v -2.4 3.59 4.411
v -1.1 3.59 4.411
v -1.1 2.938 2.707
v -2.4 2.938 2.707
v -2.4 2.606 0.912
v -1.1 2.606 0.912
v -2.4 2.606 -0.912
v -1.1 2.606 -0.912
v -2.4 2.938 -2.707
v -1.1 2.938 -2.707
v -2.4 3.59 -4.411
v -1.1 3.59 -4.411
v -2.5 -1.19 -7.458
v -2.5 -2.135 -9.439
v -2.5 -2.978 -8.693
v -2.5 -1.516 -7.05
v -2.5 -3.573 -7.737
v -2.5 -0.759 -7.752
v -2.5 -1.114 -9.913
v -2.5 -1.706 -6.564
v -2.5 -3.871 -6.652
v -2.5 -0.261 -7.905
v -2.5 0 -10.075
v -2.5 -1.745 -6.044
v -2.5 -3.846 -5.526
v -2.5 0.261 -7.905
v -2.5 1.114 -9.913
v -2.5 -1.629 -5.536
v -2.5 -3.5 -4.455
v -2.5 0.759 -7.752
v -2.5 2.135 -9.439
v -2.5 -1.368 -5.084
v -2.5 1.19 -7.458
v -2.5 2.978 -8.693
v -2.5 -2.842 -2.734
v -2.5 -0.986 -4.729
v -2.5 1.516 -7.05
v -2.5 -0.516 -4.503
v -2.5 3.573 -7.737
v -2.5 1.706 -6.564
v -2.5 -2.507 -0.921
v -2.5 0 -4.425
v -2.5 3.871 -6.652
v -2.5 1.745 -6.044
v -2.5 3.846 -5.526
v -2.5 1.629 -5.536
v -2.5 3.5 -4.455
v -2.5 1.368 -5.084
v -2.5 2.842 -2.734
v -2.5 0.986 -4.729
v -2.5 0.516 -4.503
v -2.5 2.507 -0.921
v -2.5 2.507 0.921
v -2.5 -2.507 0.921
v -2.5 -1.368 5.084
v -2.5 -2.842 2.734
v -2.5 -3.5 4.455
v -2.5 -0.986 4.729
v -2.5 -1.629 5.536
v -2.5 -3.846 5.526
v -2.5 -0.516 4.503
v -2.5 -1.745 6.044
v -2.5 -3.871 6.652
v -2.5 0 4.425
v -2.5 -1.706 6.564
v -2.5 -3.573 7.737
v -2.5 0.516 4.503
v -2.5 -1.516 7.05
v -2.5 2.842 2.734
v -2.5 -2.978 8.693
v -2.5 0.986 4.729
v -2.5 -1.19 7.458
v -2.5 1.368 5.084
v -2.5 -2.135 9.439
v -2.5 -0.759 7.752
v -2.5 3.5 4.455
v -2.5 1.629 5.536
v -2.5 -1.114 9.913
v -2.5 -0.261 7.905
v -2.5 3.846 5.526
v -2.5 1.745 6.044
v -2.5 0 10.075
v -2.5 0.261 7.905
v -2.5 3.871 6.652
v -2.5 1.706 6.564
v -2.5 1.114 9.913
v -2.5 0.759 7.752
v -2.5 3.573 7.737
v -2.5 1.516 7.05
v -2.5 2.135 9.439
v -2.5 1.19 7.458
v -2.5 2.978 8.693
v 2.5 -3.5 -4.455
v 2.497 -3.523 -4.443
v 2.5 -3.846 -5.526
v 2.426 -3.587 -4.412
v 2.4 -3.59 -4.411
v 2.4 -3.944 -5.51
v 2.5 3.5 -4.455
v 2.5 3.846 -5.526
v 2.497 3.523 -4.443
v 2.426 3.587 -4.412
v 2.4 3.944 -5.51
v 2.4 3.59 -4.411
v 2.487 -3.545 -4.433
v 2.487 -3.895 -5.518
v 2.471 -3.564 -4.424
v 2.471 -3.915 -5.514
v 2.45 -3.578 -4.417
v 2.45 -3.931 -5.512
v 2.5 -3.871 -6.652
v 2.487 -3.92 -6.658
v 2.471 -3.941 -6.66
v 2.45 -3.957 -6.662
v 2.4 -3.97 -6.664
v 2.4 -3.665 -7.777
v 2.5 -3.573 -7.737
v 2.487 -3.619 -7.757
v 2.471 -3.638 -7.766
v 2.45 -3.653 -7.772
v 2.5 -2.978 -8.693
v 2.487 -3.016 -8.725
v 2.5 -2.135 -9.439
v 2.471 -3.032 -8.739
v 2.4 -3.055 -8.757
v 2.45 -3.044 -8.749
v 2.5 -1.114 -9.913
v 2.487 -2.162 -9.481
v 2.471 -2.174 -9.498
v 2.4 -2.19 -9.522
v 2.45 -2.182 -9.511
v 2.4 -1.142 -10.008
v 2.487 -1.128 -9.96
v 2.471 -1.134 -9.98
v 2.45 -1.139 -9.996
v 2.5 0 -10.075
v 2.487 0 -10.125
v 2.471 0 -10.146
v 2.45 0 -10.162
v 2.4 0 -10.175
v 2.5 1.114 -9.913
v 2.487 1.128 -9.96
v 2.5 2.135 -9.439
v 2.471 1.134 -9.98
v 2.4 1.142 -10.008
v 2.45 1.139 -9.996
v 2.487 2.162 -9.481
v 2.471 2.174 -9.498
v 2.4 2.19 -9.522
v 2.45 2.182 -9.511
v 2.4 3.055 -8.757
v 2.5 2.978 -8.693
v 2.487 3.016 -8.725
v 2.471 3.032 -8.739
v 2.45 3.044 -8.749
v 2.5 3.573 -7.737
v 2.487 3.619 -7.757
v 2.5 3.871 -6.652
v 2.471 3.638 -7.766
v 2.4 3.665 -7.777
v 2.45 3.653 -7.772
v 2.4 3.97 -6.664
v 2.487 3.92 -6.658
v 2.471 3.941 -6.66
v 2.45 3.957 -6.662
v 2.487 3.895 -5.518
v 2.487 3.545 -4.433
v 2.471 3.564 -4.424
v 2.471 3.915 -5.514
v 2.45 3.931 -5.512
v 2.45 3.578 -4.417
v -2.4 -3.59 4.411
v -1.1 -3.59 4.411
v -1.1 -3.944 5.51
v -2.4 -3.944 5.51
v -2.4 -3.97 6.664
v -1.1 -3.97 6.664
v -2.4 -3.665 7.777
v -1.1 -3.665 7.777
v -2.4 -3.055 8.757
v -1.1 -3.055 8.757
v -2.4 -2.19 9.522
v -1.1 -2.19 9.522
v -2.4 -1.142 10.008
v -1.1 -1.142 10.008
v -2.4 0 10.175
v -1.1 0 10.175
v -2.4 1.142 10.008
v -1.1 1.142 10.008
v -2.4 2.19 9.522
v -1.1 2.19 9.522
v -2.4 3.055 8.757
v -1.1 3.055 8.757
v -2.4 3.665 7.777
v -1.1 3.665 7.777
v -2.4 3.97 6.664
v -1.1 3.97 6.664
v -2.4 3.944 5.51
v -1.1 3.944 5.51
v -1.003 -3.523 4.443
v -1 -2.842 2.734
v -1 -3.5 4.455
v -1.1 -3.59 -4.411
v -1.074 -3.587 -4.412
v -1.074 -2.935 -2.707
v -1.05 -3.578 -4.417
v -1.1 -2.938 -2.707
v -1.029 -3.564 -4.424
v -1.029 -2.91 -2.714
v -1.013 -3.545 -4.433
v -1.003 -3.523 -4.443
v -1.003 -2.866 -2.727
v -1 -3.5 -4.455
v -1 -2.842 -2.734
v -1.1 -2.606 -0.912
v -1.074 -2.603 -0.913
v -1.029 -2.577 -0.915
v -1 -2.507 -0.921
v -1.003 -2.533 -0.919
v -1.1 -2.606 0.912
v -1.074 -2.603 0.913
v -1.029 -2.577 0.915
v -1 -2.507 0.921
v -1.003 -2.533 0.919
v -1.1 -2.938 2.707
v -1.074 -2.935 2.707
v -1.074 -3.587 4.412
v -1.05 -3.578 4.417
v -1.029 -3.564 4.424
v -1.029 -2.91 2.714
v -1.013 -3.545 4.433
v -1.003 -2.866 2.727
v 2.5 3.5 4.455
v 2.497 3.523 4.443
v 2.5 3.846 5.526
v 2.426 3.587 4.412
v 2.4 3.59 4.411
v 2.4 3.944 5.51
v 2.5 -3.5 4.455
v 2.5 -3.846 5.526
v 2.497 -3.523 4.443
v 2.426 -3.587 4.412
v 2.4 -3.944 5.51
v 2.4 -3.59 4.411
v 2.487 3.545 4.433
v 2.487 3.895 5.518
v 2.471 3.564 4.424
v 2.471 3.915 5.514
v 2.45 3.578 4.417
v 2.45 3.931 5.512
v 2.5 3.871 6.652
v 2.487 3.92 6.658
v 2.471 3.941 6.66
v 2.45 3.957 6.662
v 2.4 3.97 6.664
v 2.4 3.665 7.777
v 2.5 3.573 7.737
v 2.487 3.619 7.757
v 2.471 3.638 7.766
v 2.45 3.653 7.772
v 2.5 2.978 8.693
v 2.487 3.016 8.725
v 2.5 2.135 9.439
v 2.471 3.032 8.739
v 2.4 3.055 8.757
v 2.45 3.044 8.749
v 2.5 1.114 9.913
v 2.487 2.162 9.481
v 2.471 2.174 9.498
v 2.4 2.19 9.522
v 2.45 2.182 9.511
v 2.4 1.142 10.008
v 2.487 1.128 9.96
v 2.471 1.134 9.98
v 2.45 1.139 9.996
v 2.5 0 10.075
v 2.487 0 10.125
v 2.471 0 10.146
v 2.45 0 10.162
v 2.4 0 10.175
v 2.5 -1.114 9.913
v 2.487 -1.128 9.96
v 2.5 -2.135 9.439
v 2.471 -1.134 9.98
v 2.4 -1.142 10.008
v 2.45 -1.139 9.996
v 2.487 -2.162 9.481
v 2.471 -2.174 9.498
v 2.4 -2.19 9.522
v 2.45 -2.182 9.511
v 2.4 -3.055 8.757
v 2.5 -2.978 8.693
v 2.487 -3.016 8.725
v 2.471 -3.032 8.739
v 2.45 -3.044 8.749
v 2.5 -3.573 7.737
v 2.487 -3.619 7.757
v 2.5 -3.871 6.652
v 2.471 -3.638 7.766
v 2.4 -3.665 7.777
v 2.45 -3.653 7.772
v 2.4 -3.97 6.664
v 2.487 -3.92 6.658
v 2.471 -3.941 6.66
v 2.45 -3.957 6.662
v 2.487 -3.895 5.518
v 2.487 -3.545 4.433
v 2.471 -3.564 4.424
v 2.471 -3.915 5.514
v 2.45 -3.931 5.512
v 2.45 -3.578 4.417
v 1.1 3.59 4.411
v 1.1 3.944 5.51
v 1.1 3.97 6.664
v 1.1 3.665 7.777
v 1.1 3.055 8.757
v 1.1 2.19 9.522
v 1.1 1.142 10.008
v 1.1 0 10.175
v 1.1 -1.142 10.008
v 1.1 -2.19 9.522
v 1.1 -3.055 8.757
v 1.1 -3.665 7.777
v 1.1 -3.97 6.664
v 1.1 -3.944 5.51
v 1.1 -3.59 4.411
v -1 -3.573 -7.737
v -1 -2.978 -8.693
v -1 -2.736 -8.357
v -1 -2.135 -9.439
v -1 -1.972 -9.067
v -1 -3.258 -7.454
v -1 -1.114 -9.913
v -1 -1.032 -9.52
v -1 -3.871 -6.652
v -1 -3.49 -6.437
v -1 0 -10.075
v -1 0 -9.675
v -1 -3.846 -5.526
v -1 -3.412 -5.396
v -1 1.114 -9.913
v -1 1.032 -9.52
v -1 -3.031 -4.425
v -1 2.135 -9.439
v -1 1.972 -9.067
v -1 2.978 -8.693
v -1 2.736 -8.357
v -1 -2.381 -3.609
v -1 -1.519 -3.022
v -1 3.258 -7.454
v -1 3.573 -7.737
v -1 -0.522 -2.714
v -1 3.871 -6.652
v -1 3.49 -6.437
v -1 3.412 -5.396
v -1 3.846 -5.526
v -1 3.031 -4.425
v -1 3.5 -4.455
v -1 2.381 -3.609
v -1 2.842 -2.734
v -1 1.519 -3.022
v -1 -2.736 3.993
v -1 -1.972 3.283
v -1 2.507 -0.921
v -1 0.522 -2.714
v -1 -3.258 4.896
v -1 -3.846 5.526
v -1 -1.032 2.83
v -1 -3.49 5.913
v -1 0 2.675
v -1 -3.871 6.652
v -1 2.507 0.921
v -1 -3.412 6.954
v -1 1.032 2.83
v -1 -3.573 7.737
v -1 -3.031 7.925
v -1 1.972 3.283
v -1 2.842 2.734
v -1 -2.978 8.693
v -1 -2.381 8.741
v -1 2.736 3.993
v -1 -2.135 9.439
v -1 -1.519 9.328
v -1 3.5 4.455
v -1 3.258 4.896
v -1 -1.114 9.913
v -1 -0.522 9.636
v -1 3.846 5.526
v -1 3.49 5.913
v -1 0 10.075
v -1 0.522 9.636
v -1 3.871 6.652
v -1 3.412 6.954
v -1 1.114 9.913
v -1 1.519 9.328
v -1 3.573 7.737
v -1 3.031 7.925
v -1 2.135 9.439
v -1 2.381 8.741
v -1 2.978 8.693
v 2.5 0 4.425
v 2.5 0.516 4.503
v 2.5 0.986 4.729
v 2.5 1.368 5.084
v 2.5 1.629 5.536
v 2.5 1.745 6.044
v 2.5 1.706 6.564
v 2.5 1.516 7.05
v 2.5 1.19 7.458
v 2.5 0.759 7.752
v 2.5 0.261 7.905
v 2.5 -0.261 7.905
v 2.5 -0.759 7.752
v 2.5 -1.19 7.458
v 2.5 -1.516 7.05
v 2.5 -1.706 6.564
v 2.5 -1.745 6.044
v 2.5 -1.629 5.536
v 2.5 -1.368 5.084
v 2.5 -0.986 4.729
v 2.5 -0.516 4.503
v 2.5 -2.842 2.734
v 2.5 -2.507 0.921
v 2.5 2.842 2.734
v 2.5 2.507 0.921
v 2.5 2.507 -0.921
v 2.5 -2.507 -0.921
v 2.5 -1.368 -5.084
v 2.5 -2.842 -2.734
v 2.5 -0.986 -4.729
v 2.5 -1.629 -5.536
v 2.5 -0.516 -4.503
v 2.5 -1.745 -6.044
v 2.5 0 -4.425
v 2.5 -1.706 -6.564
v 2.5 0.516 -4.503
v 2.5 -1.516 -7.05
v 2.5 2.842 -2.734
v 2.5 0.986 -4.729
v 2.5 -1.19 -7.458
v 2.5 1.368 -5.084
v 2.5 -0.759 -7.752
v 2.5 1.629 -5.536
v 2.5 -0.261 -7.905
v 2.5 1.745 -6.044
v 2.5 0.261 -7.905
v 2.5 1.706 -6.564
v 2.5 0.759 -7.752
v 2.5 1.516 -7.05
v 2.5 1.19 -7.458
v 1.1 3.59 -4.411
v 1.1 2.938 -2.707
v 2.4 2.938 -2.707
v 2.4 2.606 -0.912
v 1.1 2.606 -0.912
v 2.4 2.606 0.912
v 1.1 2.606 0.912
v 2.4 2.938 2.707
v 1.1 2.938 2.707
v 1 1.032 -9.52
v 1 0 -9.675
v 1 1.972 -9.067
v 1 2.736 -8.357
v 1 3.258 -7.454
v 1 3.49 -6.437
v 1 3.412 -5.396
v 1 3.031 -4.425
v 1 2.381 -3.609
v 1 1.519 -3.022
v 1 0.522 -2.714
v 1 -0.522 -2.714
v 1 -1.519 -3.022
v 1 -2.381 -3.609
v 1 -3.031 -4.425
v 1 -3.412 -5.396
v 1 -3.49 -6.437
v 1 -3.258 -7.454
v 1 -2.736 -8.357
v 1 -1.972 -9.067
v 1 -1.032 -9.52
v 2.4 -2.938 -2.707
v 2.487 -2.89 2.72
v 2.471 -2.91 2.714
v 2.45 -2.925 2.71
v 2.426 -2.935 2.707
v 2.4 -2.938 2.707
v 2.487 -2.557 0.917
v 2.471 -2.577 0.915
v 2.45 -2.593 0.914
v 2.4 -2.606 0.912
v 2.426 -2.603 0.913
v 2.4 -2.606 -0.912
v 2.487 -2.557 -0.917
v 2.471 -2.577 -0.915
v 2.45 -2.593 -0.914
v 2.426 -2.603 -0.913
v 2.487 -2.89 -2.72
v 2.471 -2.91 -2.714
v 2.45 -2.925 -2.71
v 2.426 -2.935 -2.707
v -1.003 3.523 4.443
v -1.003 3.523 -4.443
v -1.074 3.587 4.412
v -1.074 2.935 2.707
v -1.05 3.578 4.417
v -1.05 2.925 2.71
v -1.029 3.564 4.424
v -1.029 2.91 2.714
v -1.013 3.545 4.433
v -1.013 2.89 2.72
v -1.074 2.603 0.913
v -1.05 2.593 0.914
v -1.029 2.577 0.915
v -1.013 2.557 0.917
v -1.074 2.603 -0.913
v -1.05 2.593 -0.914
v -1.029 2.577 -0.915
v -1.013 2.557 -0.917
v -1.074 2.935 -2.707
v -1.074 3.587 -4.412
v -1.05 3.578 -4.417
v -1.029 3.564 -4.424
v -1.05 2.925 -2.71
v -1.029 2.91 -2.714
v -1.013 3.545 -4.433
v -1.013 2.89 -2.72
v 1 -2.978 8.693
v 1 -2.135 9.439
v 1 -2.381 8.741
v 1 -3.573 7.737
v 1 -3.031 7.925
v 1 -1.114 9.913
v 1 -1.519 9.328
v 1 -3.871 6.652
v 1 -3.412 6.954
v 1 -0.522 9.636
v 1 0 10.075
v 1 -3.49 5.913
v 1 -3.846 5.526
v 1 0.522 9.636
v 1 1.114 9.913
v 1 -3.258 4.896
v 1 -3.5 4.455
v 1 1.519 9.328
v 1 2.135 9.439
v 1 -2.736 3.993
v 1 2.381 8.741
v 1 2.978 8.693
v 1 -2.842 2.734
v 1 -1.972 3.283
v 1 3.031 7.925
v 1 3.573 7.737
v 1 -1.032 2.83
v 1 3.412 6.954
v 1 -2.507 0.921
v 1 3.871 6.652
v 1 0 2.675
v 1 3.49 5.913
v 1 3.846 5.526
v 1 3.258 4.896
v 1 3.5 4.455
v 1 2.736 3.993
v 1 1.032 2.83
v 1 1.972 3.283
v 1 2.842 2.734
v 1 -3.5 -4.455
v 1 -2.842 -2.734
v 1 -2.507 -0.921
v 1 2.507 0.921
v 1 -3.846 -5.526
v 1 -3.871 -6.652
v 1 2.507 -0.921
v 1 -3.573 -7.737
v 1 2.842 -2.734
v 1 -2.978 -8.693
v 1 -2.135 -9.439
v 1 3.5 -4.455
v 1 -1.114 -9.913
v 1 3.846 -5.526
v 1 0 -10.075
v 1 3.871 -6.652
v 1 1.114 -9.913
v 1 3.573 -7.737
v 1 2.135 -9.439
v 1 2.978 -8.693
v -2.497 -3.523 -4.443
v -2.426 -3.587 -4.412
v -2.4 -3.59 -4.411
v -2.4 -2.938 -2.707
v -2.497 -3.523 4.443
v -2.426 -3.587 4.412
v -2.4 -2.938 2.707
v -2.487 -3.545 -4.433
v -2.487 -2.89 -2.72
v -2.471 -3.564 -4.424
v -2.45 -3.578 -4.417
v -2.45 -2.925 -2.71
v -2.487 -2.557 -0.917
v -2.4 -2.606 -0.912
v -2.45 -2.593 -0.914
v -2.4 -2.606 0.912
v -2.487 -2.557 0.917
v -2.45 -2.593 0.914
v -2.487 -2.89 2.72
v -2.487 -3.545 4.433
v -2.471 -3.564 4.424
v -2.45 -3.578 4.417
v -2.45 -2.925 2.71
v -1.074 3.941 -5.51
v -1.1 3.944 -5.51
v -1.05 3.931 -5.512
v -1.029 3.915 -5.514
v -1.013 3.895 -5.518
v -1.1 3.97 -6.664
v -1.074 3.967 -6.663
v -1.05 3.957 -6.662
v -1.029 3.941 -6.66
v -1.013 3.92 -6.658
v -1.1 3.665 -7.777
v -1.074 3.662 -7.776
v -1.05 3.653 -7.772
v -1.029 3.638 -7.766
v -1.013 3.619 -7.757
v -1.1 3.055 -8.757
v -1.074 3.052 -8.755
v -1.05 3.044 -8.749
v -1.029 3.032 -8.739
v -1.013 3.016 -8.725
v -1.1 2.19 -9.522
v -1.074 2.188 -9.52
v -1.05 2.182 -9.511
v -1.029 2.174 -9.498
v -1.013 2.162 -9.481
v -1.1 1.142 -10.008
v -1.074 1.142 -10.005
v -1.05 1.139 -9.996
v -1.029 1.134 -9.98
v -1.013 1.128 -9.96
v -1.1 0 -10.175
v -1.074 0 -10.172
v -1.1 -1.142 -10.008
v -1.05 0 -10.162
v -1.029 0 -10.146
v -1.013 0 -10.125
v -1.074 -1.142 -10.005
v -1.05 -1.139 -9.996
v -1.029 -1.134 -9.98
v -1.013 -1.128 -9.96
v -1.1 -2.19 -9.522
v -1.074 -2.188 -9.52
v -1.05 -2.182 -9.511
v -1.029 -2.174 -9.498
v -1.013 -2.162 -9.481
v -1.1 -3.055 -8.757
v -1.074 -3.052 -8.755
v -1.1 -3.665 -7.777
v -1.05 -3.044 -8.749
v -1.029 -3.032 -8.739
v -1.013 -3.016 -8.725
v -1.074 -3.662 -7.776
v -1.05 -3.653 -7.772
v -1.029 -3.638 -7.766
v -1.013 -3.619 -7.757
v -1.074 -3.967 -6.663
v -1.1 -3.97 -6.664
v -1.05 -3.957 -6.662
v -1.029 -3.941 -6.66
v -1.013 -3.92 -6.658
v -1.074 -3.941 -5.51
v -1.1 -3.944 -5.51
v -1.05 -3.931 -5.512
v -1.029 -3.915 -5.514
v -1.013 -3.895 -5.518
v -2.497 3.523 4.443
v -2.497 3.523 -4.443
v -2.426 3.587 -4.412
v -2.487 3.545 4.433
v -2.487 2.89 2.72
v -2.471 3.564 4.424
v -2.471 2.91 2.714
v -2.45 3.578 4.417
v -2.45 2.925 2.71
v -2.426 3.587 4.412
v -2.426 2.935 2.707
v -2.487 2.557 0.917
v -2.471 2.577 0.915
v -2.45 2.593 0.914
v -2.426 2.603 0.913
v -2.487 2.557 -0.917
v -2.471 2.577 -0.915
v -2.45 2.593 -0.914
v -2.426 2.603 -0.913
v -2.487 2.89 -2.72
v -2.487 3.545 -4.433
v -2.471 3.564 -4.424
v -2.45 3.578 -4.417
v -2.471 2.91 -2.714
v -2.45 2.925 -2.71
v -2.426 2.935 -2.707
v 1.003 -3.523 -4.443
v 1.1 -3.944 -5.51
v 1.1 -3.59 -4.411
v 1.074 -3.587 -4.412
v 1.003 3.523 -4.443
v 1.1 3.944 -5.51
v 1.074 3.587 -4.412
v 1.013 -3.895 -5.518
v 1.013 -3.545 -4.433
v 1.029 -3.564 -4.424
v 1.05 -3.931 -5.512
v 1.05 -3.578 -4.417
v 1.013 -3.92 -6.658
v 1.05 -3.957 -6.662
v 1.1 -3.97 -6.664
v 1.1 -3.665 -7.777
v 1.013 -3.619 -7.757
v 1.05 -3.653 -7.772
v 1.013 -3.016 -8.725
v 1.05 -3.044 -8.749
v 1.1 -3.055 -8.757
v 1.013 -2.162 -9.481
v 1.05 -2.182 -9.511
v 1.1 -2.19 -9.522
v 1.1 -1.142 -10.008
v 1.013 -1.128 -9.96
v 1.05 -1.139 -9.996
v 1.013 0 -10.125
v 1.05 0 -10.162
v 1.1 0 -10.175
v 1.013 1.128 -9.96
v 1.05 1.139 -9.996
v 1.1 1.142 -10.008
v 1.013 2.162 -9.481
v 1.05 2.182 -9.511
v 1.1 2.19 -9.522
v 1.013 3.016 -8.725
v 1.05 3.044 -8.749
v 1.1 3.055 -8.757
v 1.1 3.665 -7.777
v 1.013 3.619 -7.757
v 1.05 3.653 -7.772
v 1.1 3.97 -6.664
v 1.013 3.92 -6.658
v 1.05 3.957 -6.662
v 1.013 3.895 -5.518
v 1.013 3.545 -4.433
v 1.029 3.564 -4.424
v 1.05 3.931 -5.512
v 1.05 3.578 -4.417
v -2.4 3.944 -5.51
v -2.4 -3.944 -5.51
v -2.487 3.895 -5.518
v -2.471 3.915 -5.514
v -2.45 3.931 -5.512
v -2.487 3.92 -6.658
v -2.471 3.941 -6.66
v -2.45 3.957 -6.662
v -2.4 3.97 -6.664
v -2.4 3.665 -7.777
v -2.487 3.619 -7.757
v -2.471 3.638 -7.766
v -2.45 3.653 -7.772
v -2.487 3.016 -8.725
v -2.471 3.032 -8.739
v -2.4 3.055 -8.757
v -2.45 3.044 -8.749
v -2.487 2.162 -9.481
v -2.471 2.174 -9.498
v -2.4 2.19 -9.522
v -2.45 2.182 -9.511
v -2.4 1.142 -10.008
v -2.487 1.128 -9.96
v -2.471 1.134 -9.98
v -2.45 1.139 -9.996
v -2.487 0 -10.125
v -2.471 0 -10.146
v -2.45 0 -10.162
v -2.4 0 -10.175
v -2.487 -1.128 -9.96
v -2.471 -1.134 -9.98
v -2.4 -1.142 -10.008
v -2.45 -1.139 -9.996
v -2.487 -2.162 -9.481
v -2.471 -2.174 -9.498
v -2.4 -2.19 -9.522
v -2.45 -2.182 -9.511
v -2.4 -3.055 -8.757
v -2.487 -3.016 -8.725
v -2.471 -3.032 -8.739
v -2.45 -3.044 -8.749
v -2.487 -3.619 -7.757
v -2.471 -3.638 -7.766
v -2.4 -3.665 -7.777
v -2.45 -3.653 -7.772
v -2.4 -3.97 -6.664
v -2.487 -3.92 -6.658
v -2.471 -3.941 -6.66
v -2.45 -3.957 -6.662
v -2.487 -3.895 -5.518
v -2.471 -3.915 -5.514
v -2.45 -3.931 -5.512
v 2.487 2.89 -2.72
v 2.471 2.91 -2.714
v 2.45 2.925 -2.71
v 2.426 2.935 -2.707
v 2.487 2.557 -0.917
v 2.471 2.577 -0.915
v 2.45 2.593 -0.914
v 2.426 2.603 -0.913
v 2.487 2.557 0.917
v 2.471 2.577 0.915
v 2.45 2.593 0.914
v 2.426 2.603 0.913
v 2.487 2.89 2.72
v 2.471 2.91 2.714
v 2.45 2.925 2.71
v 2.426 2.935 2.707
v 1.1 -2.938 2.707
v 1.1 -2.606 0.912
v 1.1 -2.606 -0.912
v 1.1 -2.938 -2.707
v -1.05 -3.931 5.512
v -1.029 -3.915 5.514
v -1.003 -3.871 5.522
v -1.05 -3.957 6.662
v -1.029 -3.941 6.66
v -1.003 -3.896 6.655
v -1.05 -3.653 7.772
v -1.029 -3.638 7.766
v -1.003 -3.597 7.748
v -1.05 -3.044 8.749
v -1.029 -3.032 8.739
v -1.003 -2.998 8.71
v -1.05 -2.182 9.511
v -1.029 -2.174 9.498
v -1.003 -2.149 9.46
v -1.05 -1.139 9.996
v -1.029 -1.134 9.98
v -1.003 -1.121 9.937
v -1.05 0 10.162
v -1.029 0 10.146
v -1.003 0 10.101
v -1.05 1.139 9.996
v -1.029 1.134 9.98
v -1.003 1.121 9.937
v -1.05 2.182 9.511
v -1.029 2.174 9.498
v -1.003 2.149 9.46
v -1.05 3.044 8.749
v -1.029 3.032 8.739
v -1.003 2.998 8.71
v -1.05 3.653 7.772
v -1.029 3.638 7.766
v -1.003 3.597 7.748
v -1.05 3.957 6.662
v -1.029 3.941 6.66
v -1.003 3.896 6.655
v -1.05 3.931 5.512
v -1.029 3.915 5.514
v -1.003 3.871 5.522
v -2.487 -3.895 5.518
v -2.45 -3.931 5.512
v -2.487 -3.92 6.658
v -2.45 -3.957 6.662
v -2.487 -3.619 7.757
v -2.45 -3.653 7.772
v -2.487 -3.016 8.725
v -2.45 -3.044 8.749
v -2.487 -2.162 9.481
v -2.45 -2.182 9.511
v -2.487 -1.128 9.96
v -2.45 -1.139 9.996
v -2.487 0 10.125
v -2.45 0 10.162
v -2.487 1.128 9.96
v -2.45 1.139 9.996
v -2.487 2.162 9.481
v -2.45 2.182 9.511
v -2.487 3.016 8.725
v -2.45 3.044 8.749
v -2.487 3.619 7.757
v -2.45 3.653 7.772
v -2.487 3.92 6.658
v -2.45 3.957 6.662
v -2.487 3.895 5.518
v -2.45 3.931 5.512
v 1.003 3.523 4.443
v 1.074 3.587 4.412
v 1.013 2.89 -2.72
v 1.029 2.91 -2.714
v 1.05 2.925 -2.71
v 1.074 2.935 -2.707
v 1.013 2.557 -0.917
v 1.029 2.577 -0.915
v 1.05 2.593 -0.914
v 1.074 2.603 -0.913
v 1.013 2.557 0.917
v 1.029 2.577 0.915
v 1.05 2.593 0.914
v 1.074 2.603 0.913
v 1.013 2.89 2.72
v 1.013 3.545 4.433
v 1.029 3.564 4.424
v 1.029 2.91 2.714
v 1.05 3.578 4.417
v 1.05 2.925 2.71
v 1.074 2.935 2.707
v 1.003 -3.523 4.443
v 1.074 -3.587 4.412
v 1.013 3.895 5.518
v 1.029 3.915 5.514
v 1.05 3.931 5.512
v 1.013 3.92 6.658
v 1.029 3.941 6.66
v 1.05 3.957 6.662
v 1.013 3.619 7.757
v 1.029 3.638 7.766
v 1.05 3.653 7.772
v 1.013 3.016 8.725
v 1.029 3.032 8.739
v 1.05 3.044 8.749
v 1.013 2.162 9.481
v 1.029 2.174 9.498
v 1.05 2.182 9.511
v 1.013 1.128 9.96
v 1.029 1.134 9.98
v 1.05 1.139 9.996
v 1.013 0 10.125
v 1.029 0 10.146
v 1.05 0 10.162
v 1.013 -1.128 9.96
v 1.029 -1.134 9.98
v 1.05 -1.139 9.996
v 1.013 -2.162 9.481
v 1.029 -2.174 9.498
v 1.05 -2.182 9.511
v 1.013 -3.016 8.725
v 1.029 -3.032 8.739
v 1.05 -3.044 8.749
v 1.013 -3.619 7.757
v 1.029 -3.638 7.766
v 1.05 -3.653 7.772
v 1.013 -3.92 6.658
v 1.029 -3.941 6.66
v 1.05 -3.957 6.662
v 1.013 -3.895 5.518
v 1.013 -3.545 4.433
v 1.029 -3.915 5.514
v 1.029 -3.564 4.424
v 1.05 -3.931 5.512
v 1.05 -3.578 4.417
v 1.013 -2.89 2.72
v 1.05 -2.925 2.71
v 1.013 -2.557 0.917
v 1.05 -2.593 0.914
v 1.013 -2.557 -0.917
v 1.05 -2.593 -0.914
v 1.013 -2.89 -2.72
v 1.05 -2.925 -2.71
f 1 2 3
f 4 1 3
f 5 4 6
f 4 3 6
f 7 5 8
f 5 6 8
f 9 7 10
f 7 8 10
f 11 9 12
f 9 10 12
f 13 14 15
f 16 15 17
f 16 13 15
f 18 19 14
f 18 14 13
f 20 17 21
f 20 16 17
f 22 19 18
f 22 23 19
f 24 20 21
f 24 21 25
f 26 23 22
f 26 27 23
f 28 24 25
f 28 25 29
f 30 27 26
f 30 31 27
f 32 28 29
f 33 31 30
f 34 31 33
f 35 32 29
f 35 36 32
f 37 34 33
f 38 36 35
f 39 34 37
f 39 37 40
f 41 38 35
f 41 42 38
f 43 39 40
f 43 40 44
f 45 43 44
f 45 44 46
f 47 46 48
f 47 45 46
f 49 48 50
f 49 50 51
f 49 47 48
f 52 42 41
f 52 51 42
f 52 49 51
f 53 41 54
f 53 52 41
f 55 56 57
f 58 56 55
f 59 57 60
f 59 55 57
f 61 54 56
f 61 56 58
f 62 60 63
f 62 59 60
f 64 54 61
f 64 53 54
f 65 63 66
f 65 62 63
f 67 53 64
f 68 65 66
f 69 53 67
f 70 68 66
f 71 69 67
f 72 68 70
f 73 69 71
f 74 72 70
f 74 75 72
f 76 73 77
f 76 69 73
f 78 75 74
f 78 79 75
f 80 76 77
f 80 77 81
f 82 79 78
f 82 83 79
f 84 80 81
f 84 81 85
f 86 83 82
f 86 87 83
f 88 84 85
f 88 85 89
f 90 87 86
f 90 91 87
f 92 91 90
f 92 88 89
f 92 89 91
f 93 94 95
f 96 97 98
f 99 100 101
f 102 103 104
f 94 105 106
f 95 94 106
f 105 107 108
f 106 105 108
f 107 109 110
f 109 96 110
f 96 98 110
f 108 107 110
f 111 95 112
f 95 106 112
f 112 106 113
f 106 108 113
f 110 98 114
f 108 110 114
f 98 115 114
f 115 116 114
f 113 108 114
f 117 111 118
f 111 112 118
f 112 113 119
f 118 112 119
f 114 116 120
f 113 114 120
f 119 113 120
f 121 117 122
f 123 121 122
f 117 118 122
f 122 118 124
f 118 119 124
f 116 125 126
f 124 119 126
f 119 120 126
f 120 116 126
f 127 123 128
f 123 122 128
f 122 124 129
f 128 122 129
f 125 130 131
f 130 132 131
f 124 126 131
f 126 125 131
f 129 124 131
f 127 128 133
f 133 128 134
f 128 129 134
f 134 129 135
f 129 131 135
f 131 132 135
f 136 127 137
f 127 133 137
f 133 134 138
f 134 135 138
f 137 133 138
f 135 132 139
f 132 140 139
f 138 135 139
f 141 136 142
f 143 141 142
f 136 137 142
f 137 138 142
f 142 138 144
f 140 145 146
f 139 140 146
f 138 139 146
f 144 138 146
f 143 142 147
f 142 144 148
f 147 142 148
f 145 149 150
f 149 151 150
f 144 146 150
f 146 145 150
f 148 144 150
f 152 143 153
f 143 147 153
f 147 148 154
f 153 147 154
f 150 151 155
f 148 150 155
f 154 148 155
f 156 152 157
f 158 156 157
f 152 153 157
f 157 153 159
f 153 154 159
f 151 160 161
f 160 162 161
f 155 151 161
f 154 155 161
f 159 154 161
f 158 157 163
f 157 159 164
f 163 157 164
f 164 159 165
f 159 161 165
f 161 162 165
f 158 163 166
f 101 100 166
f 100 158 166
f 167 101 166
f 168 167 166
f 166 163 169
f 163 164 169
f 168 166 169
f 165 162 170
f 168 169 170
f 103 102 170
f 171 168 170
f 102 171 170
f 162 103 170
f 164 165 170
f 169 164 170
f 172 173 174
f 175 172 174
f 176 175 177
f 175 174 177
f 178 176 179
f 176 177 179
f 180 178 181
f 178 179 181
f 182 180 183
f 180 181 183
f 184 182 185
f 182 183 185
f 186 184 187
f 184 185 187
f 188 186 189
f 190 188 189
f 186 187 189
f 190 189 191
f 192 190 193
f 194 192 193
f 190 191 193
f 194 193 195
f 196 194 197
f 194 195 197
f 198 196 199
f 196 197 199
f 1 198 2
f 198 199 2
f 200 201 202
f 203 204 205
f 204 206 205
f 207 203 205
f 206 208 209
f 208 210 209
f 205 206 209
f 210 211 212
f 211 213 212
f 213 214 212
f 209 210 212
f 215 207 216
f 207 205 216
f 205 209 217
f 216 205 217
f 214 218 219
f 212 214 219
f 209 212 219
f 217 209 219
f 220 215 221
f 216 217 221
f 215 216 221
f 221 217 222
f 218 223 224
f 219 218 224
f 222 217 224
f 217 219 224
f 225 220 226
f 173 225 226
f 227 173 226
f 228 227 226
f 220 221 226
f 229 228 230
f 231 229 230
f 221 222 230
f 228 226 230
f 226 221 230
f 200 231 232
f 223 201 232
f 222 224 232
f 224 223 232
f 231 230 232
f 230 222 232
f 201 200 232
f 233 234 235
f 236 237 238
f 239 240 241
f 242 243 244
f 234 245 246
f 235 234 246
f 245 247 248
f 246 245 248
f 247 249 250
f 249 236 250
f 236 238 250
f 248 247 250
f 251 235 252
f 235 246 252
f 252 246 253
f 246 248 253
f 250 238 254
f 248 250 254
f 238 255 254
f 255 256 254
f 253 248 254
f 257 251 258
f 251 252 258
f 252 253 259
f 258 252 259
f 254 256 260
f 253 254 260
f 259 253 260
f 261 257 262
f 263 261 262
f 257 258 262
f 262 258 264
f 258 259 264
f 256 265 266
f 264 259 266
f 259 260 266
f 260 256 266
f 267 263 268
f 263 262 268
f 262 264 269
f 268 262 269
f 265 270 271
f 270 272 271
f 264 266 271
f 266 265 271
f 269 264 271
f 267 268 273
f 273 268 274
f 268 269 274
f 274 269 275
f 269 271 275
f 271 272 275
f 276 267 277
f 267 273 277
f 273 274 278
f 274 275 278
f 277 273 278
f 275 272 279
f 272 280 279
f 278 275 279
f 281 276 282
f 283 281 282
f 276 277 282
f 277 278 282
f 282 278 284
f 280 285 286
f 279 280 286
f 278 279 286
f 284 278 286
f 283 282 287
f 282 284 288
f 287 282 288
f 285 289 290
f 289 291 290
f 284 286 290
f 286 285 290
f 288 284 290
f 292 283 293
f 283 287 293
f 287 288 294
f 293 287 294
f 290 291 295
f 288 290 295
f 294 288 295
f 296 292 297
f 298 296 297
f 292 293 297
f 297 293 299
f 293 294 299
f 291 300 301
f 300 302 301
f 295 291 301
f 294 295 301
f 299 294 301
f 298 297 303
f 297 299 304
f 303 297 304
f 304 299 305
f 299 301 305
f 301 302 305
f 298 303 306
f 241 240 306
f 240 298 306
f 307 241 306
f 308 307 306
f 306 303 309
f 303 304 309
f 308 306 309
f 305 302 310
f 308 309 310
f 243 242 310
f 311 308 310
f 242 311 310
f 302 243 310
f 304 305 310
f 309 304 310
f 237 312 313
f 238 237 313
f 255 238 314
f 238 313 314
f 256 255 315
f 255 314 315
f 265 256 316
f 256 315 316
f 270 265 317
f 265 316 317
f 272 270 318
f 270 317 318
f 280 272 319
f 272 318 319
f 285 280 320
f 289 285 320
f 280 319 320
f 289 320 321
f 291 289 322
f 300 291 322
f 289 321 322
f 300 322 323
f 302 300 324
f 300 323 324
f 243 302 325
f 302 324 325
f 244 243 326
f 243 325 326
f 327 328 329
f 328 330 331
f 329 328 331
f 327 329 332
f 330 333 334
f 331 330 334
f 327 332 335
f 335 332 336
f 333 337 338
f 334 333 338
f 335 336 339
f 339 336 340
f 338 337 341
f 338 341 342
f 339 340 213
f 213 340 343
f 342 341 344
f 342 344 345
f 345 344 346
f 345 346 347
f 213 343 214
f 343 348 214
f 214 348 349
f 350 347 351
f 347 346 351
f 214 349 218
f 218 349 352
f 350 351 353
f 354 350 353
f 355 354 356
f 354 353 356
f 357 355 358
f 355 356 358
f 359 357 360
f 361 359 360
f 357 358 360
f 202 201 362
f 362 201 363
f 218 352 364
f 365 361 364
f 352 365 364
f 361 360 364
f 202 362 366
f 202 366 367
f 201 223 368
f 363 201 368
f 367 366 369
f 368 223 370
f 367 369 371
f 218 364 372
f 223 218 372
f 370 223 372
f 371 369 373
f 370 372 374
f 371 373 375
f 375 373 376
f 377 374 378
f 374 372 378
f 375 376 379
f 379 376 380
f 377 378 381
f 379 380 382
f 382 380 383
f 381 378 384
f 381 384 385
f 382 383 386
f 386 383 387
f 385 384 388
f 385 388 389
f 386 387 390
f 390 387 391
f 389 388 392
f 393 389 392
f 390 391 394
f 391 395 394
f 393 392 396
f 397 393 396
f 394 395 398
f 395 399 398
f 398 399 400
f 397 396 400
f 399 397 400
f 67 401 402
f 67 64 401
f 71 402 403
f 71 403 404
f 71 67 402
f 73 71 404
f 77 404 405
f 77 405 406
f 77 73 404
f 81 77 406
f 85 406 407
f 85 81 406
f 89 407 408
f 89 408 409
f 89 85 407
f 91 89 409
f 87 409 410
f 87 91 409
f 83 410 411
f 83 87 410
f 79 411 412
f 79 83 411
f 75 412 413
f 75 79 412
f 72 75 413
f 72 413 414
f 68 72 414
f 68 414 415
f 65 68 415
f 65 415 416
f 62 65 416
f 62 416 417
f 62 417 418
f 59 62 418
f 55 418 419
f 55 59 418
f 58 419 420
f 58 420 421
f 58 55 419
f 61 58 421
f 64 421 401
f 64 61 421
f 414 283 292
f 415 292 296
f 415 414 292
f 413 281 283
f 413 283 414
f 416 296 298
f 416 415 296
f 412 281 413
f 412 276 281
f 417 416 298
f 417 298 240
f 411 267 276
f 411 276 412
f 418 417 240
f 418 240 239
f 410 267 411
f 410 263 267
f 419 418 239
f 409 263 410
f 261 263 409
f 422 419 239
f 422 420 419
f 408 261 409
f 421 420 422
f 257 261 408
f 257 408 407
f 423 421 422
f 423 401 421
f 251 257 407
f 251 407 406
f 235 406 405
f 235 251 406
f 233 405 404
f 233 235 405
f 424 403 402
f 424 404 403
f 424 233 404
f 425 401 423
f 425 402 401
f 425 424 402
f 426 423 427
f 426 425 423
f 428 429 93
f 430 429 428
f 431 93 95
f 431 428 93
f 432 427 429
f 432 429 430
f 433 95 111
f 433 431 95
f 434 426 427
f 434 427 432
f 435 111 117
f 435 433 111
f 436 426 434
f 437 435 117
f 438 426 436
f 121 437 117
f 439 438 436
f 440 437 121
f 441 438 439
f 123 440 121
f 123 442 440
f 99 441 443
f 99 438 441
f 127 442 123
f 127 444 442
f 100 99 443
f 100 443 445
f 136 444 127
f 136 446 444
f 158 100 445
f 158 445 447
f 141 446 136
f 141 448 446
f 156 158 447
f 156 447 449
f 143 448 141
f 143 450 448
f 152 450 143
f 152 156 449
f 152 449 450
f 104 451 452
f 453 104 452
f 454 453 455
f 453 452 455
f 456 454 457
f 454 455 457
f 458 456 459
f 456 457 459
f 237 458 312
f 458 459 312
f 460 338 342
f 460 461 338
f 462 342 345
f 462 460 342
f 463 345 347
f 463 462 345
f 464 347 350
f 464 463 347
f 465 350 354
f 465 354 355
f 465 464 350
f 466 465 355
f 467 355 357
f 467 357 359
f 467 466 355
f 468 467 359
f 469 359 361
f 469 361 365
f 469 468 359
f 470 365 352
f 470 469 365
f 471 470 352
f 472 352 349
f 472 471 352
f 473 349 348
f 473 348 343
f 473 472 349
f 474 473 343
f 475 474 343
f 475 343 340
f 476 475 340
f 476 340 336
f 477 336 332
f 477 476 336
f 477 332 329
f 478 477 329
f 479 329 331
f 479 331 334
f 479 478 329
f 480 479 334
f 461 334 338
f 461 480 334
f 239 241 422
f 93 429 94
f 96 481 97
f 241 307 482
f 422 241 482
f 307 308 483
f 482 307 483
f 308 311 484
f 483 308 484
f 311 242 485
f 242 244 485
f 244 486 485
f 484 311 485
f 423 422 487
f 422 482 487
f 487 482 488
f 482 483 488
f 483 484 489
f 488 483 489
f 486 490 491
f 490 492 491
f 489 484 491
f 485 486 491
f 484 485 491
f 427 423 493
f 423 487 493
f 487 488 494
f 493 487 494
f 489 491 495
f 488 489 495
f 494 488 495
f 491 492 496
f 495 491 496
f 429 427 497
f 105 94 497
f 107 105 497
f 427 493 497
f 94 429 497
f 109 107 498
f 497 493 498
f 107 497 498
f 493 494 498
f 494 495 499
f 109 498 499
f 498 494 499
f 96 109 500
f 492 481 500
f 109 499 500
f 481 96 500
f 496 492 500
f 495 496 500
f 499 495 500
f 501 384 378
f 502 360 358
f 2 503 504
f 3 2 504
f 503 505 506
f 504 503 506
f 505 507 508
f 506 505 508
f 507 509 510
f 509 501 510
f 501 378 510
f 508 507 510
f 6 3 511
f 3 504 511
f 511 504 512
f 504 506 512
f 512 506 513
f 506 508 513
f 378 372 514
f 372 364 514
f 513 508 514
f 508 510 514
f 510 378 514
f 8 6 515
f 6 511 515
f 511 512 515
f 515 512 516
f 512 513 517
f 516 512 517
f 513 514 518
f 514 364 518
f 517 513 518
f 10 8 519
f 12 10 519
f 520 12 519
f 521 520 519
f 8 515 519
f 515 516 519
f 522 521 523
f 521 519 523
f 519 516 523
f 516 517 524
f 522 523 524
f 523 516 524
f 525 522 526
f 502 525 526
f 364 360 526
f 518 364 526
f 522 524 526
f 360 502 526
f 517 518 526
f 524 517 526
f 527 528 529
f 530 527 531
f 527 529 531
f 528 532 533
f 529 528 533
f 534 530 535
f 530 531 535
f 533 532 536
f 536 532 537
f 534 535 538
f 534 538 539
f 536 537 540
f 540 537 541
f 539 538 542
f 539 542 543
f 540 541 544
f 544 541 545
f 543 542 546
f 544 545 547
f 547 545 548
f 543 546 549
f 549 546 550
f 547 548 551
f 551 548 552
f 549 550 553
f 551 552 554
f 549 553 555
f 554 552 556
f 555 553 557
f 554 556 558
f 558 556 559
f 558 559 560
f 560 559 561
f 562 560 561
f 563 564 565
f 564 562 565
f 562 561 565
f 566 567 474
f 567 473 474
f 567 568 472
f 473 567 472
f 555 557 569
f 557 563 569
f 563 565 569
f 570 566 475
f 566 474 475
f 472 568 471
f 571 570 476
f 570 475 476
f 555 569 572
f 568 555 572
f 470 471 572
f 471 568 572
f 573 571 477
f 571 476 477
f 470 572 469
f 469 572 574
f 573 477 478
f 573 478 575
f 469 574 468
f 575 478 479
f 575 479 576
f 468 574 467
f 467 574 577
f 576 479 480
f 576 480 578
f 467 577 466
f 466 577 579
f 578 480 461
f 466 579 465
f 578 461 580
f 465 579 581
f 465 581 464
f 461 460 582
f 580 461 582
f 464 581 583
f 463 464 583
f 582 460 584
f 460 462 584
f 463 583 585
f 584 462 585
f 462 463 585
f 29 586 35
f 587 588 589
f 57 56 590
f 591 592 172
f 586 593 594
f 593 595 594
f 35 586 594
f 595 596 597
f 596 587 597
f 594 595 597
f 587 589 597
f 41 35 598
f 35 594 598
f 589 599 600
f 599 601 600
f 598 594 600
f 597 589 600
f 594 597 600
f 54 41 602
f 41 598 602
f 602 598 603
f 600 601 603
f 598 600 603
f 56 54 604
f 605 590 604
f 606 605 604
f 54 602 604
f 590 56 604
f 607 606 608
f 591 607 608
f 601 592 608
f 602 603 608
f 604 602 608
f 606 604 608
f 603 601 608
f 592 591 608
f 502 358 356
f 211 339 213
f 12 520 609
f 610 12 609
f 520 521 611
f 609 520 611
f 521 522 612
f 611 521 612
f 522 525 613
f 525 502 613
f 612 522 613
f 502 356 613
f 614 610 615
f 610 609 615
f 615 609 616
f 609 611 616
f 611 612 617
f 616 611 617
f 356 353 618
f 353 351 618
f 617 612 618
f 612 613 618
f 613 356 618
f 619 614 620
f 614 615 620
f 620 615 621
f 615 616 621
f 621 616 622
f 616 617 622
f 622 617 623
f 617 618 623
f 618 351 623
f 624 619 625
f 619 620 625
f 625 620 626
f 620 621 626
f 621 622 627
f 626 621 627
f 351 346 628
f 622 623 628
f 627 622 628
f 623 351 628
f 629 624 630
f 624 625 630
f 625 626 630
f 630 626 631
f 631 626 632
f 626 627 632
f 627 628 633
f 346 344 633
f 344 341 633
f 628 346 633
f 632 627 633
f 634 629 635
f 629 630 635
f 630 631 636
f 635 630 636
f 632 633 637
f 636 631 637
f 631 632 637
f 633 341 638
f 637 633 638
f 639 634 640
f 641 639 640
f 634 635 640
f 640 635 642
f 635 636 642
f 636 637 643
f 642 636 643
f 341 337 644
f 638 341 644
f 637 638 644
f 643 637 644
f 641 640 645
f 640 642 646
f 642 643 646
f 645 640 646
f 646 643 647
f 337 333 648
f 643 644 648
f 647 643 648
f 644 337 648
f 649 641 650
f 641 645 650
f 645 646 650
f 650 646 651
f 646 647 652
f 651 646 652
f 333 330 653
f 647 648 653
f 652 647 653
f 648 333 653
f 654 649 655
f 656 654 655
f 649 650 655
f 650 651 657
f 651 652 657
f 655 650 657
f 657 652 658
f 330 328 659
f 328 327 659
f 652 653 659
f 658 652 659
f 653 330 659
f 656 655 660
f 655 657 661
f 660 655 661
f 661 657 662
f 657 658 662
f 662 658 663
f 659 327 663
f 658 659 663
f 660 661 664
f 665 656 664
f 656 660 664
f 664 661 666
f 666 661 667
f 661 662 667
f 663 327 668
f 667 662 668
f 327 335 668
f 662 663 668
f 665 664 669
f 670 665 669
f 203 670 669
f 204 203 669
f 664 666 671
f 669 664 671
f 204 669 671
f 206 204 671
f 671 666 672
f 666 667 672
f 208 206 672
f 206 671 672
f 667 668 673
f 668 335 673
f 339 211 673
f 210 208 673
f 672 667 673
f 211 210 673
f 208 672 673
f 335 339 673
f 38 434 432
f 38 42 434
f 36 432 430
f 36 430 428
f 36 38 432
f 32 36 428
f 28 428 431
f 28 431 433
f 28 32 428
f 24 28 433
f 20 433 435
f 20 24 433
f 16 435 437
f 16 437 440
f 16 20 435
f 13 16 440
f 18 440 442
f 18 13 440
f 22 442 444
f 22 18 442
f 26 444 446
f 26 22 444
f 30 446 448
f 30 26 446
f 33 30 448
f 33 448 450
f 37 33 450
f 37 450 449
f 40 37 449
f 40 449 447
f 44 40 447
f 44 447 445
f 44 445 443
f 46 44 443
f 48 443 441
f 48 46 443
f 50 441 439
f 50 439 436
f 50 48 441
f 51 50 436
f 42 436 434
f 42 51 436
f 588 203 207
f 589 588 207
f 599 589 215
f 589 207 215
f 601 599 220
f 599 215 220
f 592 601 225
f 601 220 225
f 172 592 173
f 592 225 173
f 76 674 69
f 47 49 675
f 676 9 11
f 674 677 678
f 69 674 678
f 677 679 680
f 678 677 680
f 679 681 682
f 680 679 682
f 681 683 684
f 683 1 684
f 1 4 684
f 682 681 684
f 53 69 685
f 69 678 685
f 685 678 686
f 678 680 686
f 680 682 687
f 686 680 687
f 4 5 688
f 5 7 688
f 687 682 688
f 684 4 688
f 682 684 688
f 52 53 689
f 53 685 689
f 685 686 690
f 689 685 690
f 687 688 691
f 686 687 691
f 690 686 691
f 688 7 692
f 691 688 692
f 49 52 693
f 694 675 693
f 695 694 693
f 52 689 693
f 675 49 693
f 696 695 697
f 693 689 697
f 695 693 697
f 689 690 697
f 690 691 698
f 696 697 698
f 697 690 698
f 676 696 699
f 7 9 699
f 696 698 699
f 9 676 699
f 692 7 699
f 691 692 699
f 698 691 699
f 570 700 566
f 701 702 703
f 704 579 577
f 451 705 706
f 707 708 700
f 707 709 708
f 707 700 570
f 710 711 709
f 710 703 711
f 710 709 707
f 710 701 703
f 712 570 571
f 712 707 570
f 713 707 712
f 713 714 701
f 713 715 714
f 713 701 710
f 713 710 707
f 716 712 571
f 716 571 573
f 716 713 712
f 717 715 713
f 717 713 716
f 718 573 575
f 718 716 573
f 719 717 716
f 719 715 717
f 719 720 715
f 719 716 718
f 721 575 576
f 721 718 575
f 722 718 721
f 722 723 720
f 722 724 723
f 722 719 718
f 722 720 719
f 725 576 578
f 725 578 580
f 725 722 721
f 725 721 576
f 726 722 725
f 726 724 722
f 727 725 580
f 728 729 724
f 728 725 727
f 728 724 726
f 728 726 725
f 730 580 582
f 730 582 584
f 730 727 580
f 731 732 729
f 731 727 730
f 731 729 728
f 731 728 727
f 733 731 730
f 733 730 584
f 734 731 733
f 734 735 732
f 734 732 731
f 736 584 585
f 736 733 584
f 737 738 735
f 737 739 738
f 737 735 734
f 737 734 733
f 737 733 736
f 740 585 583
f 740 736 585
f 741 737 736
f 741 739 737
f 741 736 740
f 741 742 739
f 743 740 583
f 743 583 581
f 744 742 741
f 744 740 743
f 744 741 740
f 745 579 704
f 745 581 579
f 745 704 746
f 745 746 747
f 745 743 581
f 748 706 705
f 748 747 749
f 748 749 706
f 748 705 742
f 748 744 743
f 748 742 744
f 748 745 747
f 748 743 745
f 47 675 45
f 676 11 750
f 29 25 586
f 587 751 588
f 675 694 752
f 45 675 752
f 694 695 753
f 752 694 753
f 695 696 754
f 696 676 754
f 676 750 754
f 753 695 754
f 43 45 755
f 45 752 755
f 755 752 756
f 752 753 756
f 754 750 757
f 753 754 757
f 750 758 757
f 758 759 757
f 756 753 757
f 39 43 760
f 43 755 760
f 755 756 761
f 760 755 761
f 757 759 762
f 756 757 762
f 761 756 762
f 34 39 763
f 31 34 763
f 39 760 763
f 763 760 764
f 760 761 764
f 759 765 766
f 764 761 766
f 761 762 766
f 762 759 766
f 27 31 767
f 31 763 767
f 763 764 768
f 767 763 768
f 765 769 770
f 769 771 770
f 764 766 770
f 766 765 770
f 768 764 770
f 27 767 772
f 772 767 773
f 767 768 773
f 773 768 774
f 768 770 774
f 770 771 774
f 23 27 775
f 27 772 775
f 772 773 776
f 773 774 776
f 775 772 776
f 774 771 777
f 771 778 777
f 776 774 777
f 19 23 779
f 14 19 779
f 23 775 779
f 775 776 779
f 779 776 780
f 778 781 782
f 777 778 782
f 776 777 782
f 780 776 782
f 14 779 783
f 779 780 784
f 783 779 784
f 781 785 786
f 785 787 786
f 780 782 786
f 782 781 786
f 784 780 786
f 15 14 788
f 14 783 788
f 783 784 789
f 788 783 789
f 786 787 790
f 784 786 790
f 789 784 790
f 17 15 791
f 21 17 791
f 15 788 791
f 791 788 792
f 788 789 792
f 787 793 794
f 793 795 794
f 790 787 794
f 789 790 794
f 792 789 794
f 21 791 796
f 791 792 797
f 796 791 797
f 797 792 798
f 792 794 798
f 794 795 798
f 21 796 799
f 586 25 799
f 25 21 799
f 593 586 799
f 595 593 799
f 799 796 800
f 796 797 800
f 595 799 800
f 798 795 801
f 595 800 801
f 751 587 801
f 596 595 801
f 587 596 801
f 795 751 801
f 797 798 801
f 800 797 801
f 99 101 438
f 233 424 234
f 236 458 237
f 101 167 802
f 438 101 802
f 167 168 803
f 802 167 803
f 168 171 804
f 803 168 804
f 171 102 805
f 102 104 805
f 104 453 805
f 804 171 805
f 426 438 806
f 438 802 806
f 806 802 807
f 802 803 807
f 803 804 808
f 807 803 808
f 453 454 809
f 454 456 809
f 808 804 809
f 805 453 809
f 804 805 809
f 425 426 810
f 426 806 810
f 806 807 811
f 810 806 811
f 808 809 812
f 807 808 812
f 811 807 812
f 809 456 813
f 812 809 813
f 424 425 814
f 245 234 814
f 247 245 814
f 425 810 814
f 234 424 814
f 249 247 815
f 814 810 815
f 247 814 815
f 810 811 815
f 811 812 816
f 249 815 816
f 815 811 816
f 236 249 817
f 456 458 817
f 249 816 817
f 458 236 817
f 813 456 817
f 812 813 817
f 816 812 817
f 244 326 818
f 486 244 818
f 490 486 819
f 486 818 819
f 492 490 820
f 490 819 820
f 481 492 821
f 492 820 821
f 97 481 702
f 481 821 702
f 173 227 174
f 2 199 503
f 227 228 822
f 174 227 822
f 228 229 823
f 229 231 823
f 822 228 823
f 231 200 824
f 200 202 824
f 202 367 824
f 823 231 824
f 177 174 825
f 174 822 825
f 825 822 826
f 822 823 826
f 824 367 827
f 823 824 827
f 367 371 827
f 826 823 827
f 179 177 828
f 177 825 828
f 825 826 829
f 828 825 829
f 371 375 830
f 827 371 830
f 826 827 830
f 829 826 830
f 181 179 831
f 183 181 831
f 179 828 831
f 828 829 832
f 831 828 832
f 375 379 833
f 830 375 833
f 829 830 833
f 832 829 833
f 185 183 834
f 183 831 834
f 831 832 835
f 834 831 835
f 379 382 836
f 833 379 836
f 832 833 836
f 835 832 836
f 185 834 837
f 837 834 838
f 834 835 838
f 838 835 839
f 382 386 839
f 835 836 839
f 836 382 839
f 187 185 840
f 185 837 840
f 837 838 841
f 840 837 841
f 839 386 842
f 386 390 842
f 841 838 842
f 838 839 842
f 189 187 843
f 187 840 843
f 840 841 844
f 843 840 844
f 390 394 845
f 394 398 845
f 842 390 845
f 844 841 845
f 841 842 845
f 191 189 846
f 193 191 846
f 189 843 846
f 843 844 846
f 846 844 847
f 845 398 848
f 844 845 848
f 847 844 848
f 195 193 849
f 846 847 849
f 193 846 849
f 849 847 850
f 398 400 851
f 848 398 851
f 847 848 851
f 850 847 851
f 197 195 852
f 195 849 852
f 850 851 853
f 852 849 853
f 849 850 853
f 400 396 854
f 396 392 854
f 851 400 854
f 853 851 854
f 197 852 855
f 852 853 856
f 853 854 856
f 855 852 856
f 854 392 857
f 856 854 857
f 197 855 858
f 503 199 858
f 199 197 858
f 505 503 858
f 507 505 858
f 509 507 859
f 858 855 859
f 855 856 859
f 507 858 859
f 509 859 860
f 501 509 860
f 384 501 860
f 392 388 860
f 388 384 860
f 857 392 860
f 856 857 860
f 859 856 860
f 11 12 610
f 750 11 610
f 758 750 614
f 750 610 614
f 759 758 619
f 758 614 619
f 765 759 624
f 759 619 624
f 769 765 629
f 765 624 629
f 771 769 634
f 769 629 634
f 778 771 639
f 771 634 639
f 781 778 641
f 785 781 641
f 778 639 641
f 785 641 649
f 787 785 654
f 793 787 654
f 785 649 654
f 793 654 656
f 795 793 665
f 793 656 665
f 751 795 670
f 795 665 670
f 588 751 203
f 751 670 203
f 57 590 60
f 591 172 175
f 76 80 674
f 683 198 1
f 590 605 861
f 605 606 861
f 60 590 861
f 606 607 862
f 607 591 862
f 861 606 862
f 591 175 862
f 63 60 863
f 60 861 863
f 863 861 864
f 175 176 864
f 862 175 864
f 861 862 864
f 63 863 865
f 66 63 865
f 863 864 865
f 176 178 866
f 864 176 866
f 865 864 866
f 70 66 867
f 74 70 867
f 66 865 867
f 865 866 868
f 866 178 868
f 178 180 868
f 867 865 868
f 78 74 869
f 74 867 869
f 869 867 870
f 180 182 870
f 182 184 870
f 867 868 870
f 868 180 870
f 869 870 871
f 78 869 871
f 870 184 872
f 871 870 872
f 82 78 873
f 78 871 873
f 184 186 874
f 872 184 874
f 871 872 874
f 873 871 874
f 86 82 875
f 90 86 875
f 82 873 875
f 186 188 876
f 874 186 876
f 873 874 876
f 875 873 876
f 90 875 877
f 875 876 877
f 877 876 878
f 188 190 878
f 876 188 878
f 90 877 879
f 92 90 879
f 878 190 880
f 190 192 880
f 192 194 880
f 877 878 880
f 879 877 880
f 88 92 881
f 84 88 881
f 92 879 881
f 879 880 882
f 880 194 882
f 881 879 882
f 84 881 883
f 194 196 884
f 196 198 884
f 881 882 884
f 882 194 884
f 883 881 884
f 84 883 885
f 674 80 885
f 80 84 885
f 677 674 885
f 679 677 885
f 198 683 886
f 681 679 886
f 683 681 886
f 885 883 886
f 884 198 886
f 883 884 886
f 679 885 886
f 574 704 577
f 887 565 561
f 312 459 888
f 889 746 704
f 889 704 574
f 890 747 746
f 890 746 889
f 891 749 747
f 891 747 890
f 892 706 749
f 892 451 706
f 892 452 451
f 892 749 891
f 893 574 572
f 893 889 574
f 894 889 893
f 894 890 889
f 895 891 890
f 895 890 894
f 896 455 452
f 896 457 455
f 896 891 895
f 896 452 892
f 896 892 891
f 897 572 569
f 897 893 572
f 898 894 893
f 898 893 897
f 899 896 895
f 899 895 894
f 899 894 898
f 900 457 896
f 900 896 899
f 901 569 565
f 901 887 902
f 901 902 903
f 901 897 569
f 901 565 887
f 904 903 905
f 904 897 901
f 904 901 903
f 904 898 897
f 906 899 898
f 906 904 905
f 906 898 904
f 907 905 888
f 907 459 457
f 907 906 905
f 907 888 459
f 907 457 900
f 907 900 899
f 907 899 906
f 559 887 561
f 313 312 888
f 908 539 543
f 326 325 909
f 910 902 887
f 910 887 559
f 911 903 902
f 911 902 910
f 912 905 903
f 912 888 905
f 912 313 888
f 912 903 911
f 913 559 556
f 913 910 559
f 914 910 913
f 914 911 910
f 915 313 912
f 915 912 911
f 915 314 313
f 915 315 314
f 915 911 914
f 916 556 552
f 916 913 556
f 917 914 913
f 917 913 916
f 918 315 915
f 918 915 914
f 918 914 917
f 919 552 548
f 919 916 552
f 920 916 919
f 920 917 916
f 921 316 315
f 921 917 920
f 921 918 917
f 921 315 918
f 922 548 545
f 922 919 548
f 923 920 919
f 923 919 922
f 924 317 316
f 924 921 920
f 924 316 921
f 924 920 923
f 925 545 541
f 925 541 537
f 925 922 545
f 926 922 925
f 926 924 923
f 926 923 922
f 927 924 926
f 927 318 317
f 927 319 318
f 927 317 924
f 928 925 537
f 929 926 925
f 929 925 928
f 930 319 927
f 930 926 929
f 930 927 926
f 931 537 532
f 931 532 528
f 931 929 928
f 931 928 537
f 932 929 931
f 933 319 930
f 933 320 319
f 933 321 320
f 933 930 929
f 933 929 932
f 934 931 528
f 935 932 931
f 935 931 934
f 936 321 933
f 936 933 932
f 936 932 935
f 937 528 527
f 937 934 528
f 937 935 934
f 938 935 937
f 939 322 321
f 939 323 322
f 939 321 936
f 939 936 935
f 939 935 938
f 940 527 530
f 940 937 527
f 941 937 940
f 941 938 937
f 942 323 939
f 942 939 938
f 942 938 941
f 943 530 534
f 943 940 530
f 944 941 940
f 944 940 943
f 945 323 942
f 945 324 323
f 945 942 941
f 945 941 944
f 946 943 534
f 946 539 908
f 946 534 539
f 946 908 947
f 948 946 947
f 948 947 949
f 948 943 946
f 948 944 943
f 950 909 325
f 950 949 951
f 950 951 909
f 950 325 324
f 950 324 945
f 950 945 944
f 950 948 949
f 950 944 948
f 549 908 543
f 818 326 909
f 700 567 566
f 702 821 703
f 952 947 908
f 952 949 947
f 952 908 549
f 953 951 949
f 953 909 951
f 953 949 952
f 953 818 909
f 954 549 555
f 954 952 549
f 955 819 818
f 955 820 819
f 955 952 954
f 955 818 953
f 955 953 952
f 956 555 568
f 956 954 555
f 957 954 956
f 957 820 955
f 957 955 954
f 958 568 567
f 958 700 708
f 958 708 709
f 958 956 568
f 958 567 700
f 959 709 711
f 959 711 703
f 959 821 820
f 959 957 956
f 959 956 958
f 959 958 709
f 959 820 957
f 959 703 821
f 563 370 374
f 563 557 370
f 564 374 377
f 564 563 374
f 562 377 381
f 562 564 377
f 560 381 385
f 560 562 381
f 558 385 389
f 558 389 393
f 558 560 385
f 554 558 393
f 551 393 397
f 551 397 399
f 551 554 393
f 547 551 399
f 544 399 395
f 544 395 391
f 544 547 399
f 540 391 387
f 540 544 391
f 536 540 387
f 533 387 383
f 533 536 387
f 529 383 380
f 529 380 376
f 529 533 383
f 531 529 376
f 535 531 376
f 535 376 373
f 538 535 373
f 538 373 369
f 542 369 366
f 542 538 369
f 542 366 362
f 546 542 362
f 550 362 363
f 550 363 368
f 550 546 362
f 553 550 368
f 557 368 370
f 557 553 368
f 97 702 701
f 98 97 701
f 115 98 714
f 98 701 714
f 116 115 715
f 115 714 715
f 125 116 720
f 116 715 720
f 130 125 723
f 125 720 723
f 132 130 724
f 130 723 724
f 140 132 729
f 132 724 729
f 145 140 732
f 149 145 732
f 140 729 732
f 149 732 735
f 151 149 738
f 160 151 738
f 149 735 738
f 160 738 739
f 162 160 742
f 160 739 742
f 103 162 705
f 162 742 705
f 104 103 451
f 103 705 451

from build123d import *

# Parameters (mm, degrees)
BOSS_EXTRUDE1_START = 1
SKETCH1_R           = 1.75
BOSS_EXTRUDE1_DEPTH = 1.5
BOSS_EXTRUDE2_START = -1
SKETCH2_R           = 1.75
BOSS_EXTRUDE2_DEPTH = 1.5
SKETCH3_R           = 3.5
SKETCH3_R_2         = 1.75
BOSS_EXTRUDE3_DEPTH = 1
FILLET1_R           = 0.1


with BuildPart() as part:
    # Sketch1 → Boss-Extrude1 (new body)
    with BuildSketch(Plane(origin=(0, 0, 0), x_dir=(0, 0, -1), z_dir=(1, 0, 0)).offset(BOSS_EXTRUDE1_START)):
        with BuildLine():
            ThreePointArc((-4.410714286, 3.589888009), (-10.175, 0), (-4.410714286, -3.589888009))
            ThreePointArc((-4.410714286, -3.589888009), (0, -2.564608032), (4.410714286, -3.589888009))
            ThreePointArc((4.410714286, -3.589888009), (10.175, 0), (4.410714286, 3.589888009))
            ThreePointArc((4.410714286, 3.589888009), (0, 2.564608032), (-4.410714286, 3.589888009))
        make_face()
        with Locations((-6.175, 0)):
            Circle(SKETCH1_R, mode=Mode.SUBTRACT)
        with Locations(Location((6.175, 0, 0), (0, 0, 180))):
            Circle(SKETCH1_R, mode=Mode.SUBTRACT)
    extrude(amount=BOSS_EXTRUDE1_DEPTH)



with BuildPart() as body_2:
    # Sketch2 → Boss-Extrude2 (new body)
    with BuildSketch(Plane(origin=(0, 0, 0), x_dir=(0, 0, -1), z_dir=(1, 0, 0)).offset(BOSS_EXTRUDE2_START)):
        with BuildLine():
            ThreePointArc((-4.410714286, 3.589888009), (0, 2.564608032), (4.410714286, 3.589888009))
            ThreePointArc((4.410714286, 3.589888009), (10.175, 0), (4.410714286, -3.589888009))
            ThreePointArc((4.410714286, -3.589888009), (0, -2.564608032), (-4.410714286, -3.589888009))
            ThreePointArc((-4.410714286, -3.589888009), (-10.175, 0), (-4.410714286, 3.589888009))
        make_face()
        with Locations(Location((6.175, 0, 0), (0, 0, 180))):
            Circle(SKETCH2_R, mode=Mode.SUBTRACT)
        with Locations((-6.175, 0)):
            Circle(SKETCH2_R, mode=Mode.SUBTRACT)
    extrude(amount=-BOSS_EXTRUDE2_DEPTH)


with BuildPart() as part_1:
    add(part.part)

    add(body_2.part)  # Boss-Extrude3 merges body 2
    # Sketch3 → Boss-Extrude3 (add, symmetric)
    # profile 1 of 2: a face of its own
    with BuildSketch(Plane(origin=(0, 0, 0), x_dir=(0, 0, -1), z_dir=(1, 0, 0))):
        with Locations((-6.175, 0)):
            Circle(SKETCH3_R)
        with Locations((-6.175, 0)):
            Circle(SKETCH3_R_2, mode=Mode.SUBTRACT)
    # profile 2 of 2: a face of its own
    with BuildSketch(Plane(origin=(0, 0, 0), x_dir=(0, 0, -1), z_dir=(1, 0, 0))):
        with Locations((6.175, 0)):
            Circle(SKETCH3_R)
        with Locations(Location((6.175, 0, 0), (0, 0, 180))):
            Circle(SKETCH3_R_2, mode=Mode.SUBTRACT)
    extrude(amount=BOSS_EXTRUDE3_DEPTH, both=True)

    # Fillet1
    fillet1_edges = [part_1.edges().sort_by_distance(p)[0] for p in [
        (2.5, -2.564608032, 0),
        (2.5, 0, -10.175),
        (-2.5, 0, 10.175),
        (-2.5, 2.564608032, 0),
        (-2.5, 0, -10.175),
        (-2.5, -2.564608032, 0),
        (-1, 0, 10.175),
        (-1, -2.564608032, 0),
        (-1, 0, -10.175),
        (-1, 2.564608032, 0),
        (2.5, 2.564608032, 0),
        (1, 0, -10.175),
        (1, -2.564608032, 0),
        (1, 0, 10.175),
        (1, 2.564608032, 0),
        (2.5, 0, 10.175),
    ]]
    fillet(fillet1_edges, radius=FILLET1_R)


solid = part_1.part
